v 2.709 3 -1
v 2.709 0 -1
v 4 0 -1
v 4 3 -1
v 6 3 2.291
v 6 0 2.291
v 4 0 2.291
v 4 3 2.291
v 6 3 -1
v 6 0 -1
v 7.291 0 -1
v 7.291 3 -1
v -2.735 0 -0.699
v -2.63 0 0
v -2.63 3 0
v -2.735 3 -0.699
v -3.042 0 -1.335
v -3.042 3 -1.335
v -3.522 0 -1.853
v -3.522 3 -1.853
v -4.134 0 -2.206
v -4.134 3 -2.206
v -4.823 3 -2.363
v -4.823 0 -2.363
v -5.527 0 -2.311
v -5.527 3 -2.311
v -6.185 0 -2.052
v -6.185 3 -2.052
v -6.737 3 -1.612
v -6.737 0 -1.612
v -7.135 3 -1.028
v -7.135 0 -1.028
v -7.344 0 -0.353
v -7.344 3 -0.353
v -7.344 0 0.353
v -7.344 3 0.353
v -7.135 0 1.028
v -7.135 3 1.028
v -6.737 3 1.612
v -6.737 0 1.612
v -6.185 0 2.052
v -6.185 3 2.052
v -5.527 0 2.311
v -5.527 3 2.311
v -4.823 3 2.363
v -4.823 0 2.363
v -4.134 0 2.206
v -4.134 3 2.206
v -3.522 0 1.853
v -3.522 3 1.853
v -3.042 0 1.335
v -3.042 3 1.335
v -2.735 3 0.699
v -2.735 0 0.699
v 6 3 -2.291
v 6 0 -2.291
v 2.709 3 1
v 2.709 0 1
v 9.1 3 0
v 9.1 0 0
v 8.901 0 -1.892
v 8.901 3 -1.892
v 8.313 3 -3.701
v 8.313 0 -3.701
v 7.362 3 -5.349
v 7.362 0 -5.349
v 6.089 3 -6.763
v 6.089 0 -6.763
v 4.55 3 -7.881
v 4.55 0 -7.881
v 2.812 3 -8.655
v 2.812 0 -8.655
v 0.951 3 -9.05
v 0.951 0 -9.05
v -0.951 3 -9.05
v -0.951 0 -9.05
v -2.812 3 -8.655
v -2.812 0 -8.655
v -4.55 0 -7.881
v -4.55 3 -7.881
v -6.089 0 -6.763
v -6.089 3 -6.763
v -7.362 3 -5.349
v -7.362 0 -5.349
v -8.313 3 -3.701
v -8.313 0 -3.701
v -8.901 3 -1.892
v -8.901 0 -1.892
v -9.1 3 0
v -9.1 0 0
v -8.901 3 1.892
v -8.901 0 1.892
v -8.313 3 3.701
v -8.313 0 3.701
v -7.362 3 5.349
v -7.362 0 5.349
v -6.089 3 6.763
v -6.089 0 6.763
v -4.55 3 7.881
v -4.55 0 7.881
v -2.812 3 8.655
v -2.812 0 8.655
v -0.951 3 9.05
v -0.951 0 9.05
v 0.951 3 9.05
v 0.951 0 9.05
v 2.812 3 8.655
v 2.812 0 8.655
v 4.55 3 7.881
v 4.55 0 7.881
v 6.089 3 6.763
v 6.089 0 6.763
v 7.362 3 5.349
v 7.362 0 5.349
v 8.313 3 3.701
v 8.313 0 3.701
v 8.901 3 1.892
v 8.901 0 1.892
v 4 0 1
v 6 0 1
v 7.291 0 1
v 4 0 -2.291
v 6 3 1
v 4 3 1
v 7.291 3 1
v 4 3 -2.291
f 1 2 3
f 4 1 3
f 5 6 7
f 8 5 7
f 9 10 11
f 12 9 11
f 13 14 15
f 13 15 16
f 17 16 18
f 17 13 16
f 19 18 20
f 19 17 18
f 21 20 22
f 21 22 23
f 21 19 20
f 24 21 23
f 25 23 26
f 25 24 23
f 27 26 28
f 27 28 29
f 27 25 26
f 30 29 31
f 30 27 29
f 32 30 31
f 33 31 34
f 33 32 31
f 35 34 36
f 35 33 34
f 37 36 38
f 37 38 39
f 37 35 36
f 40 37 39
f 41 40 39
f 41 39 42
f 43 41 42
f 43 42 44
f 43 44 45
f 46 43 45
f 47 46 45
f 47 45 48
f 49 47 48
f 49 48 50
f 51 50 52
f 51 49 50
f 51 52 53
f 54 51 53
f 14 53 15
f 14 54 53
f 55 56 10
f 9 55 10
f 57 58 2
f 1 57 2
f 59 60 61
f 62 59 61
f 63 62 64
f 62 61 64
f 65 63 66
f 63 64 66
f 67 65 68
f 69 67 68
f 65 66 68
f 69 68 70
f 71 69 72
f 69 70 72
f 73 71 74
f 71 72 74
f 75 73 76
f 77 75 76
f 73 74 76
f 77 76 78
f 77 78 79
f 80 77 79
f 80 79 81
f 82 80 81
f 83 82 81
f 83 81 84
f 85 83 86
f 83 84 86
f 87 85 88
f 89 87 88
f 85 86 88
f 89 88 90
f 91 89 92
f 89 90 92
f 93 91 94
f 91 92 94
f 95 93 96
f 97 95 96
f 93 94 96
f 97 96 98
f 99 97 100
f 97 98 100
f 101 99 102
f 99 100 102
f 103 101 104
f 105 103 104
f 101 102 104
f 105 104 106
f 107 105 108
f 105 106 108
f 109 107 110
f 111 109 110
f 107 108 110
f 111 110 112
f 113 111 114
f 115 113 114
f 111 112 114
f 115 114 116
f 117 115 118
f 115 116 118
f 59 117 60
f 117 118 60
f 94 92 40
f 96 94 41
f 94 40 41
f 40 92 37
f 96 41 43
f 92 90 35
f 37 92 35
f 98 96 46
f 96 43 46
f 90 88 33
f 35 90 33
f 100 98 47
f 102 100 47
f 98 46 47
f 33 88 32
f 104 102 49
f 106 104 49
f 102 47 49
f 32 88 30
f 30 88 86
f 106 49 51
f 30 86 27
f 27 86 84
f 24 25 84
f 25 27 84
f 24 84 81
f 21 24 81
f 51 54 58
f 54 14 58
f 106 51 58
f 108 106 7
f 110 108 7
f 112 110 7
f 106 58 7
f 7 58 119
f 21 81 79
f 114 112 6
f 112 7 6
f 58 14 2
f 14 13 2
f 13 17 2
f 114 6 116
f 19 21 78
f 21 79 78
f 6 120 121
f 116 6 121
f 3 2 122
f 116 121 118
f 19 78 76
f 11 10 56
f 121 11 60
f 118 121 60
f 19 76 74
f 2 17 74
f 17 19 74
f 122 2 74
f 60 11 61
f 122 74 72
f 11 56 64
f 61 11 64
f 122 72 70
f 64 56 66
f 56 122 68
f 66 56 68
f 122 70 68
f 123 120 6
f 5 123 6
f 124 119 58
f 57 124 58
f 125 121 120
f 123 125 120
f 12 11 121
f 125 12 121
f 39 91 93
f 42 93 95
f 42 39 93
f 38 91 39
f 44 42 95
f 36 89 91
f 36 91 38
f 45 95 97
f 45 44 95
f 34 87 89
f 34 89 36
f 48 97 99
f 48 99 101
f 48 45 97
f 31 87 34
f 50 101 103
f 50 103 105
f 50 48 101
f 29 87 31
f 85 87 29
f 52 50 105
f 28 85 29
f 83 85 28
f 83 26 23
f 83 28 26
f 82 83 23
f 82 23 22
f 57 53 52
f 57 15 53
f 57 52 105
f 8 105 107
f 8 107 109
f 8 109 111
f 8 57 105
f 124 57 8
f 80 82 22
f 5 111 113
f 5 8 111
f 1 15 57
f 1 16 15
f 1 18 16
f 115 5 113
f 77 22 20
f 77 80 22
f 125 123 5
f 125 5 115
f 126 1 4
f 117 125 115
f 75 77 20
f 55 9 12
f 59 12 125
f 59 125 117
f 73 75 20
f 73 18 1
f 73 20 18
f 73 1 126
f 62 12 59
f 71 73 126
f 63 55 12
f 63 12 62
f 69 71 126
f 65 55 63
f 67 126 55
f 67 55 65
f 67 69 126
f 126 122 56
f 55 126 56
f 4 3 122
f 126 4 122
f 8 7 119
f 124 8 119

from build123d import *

# Parameters (mm, degrees)
SKETCH1_R           = 9.1
SKETCH1_R_2         = 2.37
BOSS_EXTRUDE1_DEPTH = 3


with BuildPart() as part:
    # Sketch1 → Boss-Extrude1 (new body)
    with BuildSketch(Plane(origin=(0, 0, 0), x_dir=(1, 0, 0), z_dir=(0, 1, 0))):
        Circle(SKETCH1_R)
        with Locations((-5, 0)):
            Circle(SKETCH1_R_2, mode=Mode.SUBTRACT)
        Polygon((7.291287847, -1), (6, -1), (6, -2.291287847), (4, -2.291287847), (4, -1), (2.708712153, -1), (2.708712153, 1), (4, 1), (4, 2.291287847), (6, 2.291287847), (6, 1), (7.291287847, 1), align=None, mode=Mode.SUBTRACT)
    extrude(amount=BOSS_EXTRUDE1_DEPTH)


solid = part.part
